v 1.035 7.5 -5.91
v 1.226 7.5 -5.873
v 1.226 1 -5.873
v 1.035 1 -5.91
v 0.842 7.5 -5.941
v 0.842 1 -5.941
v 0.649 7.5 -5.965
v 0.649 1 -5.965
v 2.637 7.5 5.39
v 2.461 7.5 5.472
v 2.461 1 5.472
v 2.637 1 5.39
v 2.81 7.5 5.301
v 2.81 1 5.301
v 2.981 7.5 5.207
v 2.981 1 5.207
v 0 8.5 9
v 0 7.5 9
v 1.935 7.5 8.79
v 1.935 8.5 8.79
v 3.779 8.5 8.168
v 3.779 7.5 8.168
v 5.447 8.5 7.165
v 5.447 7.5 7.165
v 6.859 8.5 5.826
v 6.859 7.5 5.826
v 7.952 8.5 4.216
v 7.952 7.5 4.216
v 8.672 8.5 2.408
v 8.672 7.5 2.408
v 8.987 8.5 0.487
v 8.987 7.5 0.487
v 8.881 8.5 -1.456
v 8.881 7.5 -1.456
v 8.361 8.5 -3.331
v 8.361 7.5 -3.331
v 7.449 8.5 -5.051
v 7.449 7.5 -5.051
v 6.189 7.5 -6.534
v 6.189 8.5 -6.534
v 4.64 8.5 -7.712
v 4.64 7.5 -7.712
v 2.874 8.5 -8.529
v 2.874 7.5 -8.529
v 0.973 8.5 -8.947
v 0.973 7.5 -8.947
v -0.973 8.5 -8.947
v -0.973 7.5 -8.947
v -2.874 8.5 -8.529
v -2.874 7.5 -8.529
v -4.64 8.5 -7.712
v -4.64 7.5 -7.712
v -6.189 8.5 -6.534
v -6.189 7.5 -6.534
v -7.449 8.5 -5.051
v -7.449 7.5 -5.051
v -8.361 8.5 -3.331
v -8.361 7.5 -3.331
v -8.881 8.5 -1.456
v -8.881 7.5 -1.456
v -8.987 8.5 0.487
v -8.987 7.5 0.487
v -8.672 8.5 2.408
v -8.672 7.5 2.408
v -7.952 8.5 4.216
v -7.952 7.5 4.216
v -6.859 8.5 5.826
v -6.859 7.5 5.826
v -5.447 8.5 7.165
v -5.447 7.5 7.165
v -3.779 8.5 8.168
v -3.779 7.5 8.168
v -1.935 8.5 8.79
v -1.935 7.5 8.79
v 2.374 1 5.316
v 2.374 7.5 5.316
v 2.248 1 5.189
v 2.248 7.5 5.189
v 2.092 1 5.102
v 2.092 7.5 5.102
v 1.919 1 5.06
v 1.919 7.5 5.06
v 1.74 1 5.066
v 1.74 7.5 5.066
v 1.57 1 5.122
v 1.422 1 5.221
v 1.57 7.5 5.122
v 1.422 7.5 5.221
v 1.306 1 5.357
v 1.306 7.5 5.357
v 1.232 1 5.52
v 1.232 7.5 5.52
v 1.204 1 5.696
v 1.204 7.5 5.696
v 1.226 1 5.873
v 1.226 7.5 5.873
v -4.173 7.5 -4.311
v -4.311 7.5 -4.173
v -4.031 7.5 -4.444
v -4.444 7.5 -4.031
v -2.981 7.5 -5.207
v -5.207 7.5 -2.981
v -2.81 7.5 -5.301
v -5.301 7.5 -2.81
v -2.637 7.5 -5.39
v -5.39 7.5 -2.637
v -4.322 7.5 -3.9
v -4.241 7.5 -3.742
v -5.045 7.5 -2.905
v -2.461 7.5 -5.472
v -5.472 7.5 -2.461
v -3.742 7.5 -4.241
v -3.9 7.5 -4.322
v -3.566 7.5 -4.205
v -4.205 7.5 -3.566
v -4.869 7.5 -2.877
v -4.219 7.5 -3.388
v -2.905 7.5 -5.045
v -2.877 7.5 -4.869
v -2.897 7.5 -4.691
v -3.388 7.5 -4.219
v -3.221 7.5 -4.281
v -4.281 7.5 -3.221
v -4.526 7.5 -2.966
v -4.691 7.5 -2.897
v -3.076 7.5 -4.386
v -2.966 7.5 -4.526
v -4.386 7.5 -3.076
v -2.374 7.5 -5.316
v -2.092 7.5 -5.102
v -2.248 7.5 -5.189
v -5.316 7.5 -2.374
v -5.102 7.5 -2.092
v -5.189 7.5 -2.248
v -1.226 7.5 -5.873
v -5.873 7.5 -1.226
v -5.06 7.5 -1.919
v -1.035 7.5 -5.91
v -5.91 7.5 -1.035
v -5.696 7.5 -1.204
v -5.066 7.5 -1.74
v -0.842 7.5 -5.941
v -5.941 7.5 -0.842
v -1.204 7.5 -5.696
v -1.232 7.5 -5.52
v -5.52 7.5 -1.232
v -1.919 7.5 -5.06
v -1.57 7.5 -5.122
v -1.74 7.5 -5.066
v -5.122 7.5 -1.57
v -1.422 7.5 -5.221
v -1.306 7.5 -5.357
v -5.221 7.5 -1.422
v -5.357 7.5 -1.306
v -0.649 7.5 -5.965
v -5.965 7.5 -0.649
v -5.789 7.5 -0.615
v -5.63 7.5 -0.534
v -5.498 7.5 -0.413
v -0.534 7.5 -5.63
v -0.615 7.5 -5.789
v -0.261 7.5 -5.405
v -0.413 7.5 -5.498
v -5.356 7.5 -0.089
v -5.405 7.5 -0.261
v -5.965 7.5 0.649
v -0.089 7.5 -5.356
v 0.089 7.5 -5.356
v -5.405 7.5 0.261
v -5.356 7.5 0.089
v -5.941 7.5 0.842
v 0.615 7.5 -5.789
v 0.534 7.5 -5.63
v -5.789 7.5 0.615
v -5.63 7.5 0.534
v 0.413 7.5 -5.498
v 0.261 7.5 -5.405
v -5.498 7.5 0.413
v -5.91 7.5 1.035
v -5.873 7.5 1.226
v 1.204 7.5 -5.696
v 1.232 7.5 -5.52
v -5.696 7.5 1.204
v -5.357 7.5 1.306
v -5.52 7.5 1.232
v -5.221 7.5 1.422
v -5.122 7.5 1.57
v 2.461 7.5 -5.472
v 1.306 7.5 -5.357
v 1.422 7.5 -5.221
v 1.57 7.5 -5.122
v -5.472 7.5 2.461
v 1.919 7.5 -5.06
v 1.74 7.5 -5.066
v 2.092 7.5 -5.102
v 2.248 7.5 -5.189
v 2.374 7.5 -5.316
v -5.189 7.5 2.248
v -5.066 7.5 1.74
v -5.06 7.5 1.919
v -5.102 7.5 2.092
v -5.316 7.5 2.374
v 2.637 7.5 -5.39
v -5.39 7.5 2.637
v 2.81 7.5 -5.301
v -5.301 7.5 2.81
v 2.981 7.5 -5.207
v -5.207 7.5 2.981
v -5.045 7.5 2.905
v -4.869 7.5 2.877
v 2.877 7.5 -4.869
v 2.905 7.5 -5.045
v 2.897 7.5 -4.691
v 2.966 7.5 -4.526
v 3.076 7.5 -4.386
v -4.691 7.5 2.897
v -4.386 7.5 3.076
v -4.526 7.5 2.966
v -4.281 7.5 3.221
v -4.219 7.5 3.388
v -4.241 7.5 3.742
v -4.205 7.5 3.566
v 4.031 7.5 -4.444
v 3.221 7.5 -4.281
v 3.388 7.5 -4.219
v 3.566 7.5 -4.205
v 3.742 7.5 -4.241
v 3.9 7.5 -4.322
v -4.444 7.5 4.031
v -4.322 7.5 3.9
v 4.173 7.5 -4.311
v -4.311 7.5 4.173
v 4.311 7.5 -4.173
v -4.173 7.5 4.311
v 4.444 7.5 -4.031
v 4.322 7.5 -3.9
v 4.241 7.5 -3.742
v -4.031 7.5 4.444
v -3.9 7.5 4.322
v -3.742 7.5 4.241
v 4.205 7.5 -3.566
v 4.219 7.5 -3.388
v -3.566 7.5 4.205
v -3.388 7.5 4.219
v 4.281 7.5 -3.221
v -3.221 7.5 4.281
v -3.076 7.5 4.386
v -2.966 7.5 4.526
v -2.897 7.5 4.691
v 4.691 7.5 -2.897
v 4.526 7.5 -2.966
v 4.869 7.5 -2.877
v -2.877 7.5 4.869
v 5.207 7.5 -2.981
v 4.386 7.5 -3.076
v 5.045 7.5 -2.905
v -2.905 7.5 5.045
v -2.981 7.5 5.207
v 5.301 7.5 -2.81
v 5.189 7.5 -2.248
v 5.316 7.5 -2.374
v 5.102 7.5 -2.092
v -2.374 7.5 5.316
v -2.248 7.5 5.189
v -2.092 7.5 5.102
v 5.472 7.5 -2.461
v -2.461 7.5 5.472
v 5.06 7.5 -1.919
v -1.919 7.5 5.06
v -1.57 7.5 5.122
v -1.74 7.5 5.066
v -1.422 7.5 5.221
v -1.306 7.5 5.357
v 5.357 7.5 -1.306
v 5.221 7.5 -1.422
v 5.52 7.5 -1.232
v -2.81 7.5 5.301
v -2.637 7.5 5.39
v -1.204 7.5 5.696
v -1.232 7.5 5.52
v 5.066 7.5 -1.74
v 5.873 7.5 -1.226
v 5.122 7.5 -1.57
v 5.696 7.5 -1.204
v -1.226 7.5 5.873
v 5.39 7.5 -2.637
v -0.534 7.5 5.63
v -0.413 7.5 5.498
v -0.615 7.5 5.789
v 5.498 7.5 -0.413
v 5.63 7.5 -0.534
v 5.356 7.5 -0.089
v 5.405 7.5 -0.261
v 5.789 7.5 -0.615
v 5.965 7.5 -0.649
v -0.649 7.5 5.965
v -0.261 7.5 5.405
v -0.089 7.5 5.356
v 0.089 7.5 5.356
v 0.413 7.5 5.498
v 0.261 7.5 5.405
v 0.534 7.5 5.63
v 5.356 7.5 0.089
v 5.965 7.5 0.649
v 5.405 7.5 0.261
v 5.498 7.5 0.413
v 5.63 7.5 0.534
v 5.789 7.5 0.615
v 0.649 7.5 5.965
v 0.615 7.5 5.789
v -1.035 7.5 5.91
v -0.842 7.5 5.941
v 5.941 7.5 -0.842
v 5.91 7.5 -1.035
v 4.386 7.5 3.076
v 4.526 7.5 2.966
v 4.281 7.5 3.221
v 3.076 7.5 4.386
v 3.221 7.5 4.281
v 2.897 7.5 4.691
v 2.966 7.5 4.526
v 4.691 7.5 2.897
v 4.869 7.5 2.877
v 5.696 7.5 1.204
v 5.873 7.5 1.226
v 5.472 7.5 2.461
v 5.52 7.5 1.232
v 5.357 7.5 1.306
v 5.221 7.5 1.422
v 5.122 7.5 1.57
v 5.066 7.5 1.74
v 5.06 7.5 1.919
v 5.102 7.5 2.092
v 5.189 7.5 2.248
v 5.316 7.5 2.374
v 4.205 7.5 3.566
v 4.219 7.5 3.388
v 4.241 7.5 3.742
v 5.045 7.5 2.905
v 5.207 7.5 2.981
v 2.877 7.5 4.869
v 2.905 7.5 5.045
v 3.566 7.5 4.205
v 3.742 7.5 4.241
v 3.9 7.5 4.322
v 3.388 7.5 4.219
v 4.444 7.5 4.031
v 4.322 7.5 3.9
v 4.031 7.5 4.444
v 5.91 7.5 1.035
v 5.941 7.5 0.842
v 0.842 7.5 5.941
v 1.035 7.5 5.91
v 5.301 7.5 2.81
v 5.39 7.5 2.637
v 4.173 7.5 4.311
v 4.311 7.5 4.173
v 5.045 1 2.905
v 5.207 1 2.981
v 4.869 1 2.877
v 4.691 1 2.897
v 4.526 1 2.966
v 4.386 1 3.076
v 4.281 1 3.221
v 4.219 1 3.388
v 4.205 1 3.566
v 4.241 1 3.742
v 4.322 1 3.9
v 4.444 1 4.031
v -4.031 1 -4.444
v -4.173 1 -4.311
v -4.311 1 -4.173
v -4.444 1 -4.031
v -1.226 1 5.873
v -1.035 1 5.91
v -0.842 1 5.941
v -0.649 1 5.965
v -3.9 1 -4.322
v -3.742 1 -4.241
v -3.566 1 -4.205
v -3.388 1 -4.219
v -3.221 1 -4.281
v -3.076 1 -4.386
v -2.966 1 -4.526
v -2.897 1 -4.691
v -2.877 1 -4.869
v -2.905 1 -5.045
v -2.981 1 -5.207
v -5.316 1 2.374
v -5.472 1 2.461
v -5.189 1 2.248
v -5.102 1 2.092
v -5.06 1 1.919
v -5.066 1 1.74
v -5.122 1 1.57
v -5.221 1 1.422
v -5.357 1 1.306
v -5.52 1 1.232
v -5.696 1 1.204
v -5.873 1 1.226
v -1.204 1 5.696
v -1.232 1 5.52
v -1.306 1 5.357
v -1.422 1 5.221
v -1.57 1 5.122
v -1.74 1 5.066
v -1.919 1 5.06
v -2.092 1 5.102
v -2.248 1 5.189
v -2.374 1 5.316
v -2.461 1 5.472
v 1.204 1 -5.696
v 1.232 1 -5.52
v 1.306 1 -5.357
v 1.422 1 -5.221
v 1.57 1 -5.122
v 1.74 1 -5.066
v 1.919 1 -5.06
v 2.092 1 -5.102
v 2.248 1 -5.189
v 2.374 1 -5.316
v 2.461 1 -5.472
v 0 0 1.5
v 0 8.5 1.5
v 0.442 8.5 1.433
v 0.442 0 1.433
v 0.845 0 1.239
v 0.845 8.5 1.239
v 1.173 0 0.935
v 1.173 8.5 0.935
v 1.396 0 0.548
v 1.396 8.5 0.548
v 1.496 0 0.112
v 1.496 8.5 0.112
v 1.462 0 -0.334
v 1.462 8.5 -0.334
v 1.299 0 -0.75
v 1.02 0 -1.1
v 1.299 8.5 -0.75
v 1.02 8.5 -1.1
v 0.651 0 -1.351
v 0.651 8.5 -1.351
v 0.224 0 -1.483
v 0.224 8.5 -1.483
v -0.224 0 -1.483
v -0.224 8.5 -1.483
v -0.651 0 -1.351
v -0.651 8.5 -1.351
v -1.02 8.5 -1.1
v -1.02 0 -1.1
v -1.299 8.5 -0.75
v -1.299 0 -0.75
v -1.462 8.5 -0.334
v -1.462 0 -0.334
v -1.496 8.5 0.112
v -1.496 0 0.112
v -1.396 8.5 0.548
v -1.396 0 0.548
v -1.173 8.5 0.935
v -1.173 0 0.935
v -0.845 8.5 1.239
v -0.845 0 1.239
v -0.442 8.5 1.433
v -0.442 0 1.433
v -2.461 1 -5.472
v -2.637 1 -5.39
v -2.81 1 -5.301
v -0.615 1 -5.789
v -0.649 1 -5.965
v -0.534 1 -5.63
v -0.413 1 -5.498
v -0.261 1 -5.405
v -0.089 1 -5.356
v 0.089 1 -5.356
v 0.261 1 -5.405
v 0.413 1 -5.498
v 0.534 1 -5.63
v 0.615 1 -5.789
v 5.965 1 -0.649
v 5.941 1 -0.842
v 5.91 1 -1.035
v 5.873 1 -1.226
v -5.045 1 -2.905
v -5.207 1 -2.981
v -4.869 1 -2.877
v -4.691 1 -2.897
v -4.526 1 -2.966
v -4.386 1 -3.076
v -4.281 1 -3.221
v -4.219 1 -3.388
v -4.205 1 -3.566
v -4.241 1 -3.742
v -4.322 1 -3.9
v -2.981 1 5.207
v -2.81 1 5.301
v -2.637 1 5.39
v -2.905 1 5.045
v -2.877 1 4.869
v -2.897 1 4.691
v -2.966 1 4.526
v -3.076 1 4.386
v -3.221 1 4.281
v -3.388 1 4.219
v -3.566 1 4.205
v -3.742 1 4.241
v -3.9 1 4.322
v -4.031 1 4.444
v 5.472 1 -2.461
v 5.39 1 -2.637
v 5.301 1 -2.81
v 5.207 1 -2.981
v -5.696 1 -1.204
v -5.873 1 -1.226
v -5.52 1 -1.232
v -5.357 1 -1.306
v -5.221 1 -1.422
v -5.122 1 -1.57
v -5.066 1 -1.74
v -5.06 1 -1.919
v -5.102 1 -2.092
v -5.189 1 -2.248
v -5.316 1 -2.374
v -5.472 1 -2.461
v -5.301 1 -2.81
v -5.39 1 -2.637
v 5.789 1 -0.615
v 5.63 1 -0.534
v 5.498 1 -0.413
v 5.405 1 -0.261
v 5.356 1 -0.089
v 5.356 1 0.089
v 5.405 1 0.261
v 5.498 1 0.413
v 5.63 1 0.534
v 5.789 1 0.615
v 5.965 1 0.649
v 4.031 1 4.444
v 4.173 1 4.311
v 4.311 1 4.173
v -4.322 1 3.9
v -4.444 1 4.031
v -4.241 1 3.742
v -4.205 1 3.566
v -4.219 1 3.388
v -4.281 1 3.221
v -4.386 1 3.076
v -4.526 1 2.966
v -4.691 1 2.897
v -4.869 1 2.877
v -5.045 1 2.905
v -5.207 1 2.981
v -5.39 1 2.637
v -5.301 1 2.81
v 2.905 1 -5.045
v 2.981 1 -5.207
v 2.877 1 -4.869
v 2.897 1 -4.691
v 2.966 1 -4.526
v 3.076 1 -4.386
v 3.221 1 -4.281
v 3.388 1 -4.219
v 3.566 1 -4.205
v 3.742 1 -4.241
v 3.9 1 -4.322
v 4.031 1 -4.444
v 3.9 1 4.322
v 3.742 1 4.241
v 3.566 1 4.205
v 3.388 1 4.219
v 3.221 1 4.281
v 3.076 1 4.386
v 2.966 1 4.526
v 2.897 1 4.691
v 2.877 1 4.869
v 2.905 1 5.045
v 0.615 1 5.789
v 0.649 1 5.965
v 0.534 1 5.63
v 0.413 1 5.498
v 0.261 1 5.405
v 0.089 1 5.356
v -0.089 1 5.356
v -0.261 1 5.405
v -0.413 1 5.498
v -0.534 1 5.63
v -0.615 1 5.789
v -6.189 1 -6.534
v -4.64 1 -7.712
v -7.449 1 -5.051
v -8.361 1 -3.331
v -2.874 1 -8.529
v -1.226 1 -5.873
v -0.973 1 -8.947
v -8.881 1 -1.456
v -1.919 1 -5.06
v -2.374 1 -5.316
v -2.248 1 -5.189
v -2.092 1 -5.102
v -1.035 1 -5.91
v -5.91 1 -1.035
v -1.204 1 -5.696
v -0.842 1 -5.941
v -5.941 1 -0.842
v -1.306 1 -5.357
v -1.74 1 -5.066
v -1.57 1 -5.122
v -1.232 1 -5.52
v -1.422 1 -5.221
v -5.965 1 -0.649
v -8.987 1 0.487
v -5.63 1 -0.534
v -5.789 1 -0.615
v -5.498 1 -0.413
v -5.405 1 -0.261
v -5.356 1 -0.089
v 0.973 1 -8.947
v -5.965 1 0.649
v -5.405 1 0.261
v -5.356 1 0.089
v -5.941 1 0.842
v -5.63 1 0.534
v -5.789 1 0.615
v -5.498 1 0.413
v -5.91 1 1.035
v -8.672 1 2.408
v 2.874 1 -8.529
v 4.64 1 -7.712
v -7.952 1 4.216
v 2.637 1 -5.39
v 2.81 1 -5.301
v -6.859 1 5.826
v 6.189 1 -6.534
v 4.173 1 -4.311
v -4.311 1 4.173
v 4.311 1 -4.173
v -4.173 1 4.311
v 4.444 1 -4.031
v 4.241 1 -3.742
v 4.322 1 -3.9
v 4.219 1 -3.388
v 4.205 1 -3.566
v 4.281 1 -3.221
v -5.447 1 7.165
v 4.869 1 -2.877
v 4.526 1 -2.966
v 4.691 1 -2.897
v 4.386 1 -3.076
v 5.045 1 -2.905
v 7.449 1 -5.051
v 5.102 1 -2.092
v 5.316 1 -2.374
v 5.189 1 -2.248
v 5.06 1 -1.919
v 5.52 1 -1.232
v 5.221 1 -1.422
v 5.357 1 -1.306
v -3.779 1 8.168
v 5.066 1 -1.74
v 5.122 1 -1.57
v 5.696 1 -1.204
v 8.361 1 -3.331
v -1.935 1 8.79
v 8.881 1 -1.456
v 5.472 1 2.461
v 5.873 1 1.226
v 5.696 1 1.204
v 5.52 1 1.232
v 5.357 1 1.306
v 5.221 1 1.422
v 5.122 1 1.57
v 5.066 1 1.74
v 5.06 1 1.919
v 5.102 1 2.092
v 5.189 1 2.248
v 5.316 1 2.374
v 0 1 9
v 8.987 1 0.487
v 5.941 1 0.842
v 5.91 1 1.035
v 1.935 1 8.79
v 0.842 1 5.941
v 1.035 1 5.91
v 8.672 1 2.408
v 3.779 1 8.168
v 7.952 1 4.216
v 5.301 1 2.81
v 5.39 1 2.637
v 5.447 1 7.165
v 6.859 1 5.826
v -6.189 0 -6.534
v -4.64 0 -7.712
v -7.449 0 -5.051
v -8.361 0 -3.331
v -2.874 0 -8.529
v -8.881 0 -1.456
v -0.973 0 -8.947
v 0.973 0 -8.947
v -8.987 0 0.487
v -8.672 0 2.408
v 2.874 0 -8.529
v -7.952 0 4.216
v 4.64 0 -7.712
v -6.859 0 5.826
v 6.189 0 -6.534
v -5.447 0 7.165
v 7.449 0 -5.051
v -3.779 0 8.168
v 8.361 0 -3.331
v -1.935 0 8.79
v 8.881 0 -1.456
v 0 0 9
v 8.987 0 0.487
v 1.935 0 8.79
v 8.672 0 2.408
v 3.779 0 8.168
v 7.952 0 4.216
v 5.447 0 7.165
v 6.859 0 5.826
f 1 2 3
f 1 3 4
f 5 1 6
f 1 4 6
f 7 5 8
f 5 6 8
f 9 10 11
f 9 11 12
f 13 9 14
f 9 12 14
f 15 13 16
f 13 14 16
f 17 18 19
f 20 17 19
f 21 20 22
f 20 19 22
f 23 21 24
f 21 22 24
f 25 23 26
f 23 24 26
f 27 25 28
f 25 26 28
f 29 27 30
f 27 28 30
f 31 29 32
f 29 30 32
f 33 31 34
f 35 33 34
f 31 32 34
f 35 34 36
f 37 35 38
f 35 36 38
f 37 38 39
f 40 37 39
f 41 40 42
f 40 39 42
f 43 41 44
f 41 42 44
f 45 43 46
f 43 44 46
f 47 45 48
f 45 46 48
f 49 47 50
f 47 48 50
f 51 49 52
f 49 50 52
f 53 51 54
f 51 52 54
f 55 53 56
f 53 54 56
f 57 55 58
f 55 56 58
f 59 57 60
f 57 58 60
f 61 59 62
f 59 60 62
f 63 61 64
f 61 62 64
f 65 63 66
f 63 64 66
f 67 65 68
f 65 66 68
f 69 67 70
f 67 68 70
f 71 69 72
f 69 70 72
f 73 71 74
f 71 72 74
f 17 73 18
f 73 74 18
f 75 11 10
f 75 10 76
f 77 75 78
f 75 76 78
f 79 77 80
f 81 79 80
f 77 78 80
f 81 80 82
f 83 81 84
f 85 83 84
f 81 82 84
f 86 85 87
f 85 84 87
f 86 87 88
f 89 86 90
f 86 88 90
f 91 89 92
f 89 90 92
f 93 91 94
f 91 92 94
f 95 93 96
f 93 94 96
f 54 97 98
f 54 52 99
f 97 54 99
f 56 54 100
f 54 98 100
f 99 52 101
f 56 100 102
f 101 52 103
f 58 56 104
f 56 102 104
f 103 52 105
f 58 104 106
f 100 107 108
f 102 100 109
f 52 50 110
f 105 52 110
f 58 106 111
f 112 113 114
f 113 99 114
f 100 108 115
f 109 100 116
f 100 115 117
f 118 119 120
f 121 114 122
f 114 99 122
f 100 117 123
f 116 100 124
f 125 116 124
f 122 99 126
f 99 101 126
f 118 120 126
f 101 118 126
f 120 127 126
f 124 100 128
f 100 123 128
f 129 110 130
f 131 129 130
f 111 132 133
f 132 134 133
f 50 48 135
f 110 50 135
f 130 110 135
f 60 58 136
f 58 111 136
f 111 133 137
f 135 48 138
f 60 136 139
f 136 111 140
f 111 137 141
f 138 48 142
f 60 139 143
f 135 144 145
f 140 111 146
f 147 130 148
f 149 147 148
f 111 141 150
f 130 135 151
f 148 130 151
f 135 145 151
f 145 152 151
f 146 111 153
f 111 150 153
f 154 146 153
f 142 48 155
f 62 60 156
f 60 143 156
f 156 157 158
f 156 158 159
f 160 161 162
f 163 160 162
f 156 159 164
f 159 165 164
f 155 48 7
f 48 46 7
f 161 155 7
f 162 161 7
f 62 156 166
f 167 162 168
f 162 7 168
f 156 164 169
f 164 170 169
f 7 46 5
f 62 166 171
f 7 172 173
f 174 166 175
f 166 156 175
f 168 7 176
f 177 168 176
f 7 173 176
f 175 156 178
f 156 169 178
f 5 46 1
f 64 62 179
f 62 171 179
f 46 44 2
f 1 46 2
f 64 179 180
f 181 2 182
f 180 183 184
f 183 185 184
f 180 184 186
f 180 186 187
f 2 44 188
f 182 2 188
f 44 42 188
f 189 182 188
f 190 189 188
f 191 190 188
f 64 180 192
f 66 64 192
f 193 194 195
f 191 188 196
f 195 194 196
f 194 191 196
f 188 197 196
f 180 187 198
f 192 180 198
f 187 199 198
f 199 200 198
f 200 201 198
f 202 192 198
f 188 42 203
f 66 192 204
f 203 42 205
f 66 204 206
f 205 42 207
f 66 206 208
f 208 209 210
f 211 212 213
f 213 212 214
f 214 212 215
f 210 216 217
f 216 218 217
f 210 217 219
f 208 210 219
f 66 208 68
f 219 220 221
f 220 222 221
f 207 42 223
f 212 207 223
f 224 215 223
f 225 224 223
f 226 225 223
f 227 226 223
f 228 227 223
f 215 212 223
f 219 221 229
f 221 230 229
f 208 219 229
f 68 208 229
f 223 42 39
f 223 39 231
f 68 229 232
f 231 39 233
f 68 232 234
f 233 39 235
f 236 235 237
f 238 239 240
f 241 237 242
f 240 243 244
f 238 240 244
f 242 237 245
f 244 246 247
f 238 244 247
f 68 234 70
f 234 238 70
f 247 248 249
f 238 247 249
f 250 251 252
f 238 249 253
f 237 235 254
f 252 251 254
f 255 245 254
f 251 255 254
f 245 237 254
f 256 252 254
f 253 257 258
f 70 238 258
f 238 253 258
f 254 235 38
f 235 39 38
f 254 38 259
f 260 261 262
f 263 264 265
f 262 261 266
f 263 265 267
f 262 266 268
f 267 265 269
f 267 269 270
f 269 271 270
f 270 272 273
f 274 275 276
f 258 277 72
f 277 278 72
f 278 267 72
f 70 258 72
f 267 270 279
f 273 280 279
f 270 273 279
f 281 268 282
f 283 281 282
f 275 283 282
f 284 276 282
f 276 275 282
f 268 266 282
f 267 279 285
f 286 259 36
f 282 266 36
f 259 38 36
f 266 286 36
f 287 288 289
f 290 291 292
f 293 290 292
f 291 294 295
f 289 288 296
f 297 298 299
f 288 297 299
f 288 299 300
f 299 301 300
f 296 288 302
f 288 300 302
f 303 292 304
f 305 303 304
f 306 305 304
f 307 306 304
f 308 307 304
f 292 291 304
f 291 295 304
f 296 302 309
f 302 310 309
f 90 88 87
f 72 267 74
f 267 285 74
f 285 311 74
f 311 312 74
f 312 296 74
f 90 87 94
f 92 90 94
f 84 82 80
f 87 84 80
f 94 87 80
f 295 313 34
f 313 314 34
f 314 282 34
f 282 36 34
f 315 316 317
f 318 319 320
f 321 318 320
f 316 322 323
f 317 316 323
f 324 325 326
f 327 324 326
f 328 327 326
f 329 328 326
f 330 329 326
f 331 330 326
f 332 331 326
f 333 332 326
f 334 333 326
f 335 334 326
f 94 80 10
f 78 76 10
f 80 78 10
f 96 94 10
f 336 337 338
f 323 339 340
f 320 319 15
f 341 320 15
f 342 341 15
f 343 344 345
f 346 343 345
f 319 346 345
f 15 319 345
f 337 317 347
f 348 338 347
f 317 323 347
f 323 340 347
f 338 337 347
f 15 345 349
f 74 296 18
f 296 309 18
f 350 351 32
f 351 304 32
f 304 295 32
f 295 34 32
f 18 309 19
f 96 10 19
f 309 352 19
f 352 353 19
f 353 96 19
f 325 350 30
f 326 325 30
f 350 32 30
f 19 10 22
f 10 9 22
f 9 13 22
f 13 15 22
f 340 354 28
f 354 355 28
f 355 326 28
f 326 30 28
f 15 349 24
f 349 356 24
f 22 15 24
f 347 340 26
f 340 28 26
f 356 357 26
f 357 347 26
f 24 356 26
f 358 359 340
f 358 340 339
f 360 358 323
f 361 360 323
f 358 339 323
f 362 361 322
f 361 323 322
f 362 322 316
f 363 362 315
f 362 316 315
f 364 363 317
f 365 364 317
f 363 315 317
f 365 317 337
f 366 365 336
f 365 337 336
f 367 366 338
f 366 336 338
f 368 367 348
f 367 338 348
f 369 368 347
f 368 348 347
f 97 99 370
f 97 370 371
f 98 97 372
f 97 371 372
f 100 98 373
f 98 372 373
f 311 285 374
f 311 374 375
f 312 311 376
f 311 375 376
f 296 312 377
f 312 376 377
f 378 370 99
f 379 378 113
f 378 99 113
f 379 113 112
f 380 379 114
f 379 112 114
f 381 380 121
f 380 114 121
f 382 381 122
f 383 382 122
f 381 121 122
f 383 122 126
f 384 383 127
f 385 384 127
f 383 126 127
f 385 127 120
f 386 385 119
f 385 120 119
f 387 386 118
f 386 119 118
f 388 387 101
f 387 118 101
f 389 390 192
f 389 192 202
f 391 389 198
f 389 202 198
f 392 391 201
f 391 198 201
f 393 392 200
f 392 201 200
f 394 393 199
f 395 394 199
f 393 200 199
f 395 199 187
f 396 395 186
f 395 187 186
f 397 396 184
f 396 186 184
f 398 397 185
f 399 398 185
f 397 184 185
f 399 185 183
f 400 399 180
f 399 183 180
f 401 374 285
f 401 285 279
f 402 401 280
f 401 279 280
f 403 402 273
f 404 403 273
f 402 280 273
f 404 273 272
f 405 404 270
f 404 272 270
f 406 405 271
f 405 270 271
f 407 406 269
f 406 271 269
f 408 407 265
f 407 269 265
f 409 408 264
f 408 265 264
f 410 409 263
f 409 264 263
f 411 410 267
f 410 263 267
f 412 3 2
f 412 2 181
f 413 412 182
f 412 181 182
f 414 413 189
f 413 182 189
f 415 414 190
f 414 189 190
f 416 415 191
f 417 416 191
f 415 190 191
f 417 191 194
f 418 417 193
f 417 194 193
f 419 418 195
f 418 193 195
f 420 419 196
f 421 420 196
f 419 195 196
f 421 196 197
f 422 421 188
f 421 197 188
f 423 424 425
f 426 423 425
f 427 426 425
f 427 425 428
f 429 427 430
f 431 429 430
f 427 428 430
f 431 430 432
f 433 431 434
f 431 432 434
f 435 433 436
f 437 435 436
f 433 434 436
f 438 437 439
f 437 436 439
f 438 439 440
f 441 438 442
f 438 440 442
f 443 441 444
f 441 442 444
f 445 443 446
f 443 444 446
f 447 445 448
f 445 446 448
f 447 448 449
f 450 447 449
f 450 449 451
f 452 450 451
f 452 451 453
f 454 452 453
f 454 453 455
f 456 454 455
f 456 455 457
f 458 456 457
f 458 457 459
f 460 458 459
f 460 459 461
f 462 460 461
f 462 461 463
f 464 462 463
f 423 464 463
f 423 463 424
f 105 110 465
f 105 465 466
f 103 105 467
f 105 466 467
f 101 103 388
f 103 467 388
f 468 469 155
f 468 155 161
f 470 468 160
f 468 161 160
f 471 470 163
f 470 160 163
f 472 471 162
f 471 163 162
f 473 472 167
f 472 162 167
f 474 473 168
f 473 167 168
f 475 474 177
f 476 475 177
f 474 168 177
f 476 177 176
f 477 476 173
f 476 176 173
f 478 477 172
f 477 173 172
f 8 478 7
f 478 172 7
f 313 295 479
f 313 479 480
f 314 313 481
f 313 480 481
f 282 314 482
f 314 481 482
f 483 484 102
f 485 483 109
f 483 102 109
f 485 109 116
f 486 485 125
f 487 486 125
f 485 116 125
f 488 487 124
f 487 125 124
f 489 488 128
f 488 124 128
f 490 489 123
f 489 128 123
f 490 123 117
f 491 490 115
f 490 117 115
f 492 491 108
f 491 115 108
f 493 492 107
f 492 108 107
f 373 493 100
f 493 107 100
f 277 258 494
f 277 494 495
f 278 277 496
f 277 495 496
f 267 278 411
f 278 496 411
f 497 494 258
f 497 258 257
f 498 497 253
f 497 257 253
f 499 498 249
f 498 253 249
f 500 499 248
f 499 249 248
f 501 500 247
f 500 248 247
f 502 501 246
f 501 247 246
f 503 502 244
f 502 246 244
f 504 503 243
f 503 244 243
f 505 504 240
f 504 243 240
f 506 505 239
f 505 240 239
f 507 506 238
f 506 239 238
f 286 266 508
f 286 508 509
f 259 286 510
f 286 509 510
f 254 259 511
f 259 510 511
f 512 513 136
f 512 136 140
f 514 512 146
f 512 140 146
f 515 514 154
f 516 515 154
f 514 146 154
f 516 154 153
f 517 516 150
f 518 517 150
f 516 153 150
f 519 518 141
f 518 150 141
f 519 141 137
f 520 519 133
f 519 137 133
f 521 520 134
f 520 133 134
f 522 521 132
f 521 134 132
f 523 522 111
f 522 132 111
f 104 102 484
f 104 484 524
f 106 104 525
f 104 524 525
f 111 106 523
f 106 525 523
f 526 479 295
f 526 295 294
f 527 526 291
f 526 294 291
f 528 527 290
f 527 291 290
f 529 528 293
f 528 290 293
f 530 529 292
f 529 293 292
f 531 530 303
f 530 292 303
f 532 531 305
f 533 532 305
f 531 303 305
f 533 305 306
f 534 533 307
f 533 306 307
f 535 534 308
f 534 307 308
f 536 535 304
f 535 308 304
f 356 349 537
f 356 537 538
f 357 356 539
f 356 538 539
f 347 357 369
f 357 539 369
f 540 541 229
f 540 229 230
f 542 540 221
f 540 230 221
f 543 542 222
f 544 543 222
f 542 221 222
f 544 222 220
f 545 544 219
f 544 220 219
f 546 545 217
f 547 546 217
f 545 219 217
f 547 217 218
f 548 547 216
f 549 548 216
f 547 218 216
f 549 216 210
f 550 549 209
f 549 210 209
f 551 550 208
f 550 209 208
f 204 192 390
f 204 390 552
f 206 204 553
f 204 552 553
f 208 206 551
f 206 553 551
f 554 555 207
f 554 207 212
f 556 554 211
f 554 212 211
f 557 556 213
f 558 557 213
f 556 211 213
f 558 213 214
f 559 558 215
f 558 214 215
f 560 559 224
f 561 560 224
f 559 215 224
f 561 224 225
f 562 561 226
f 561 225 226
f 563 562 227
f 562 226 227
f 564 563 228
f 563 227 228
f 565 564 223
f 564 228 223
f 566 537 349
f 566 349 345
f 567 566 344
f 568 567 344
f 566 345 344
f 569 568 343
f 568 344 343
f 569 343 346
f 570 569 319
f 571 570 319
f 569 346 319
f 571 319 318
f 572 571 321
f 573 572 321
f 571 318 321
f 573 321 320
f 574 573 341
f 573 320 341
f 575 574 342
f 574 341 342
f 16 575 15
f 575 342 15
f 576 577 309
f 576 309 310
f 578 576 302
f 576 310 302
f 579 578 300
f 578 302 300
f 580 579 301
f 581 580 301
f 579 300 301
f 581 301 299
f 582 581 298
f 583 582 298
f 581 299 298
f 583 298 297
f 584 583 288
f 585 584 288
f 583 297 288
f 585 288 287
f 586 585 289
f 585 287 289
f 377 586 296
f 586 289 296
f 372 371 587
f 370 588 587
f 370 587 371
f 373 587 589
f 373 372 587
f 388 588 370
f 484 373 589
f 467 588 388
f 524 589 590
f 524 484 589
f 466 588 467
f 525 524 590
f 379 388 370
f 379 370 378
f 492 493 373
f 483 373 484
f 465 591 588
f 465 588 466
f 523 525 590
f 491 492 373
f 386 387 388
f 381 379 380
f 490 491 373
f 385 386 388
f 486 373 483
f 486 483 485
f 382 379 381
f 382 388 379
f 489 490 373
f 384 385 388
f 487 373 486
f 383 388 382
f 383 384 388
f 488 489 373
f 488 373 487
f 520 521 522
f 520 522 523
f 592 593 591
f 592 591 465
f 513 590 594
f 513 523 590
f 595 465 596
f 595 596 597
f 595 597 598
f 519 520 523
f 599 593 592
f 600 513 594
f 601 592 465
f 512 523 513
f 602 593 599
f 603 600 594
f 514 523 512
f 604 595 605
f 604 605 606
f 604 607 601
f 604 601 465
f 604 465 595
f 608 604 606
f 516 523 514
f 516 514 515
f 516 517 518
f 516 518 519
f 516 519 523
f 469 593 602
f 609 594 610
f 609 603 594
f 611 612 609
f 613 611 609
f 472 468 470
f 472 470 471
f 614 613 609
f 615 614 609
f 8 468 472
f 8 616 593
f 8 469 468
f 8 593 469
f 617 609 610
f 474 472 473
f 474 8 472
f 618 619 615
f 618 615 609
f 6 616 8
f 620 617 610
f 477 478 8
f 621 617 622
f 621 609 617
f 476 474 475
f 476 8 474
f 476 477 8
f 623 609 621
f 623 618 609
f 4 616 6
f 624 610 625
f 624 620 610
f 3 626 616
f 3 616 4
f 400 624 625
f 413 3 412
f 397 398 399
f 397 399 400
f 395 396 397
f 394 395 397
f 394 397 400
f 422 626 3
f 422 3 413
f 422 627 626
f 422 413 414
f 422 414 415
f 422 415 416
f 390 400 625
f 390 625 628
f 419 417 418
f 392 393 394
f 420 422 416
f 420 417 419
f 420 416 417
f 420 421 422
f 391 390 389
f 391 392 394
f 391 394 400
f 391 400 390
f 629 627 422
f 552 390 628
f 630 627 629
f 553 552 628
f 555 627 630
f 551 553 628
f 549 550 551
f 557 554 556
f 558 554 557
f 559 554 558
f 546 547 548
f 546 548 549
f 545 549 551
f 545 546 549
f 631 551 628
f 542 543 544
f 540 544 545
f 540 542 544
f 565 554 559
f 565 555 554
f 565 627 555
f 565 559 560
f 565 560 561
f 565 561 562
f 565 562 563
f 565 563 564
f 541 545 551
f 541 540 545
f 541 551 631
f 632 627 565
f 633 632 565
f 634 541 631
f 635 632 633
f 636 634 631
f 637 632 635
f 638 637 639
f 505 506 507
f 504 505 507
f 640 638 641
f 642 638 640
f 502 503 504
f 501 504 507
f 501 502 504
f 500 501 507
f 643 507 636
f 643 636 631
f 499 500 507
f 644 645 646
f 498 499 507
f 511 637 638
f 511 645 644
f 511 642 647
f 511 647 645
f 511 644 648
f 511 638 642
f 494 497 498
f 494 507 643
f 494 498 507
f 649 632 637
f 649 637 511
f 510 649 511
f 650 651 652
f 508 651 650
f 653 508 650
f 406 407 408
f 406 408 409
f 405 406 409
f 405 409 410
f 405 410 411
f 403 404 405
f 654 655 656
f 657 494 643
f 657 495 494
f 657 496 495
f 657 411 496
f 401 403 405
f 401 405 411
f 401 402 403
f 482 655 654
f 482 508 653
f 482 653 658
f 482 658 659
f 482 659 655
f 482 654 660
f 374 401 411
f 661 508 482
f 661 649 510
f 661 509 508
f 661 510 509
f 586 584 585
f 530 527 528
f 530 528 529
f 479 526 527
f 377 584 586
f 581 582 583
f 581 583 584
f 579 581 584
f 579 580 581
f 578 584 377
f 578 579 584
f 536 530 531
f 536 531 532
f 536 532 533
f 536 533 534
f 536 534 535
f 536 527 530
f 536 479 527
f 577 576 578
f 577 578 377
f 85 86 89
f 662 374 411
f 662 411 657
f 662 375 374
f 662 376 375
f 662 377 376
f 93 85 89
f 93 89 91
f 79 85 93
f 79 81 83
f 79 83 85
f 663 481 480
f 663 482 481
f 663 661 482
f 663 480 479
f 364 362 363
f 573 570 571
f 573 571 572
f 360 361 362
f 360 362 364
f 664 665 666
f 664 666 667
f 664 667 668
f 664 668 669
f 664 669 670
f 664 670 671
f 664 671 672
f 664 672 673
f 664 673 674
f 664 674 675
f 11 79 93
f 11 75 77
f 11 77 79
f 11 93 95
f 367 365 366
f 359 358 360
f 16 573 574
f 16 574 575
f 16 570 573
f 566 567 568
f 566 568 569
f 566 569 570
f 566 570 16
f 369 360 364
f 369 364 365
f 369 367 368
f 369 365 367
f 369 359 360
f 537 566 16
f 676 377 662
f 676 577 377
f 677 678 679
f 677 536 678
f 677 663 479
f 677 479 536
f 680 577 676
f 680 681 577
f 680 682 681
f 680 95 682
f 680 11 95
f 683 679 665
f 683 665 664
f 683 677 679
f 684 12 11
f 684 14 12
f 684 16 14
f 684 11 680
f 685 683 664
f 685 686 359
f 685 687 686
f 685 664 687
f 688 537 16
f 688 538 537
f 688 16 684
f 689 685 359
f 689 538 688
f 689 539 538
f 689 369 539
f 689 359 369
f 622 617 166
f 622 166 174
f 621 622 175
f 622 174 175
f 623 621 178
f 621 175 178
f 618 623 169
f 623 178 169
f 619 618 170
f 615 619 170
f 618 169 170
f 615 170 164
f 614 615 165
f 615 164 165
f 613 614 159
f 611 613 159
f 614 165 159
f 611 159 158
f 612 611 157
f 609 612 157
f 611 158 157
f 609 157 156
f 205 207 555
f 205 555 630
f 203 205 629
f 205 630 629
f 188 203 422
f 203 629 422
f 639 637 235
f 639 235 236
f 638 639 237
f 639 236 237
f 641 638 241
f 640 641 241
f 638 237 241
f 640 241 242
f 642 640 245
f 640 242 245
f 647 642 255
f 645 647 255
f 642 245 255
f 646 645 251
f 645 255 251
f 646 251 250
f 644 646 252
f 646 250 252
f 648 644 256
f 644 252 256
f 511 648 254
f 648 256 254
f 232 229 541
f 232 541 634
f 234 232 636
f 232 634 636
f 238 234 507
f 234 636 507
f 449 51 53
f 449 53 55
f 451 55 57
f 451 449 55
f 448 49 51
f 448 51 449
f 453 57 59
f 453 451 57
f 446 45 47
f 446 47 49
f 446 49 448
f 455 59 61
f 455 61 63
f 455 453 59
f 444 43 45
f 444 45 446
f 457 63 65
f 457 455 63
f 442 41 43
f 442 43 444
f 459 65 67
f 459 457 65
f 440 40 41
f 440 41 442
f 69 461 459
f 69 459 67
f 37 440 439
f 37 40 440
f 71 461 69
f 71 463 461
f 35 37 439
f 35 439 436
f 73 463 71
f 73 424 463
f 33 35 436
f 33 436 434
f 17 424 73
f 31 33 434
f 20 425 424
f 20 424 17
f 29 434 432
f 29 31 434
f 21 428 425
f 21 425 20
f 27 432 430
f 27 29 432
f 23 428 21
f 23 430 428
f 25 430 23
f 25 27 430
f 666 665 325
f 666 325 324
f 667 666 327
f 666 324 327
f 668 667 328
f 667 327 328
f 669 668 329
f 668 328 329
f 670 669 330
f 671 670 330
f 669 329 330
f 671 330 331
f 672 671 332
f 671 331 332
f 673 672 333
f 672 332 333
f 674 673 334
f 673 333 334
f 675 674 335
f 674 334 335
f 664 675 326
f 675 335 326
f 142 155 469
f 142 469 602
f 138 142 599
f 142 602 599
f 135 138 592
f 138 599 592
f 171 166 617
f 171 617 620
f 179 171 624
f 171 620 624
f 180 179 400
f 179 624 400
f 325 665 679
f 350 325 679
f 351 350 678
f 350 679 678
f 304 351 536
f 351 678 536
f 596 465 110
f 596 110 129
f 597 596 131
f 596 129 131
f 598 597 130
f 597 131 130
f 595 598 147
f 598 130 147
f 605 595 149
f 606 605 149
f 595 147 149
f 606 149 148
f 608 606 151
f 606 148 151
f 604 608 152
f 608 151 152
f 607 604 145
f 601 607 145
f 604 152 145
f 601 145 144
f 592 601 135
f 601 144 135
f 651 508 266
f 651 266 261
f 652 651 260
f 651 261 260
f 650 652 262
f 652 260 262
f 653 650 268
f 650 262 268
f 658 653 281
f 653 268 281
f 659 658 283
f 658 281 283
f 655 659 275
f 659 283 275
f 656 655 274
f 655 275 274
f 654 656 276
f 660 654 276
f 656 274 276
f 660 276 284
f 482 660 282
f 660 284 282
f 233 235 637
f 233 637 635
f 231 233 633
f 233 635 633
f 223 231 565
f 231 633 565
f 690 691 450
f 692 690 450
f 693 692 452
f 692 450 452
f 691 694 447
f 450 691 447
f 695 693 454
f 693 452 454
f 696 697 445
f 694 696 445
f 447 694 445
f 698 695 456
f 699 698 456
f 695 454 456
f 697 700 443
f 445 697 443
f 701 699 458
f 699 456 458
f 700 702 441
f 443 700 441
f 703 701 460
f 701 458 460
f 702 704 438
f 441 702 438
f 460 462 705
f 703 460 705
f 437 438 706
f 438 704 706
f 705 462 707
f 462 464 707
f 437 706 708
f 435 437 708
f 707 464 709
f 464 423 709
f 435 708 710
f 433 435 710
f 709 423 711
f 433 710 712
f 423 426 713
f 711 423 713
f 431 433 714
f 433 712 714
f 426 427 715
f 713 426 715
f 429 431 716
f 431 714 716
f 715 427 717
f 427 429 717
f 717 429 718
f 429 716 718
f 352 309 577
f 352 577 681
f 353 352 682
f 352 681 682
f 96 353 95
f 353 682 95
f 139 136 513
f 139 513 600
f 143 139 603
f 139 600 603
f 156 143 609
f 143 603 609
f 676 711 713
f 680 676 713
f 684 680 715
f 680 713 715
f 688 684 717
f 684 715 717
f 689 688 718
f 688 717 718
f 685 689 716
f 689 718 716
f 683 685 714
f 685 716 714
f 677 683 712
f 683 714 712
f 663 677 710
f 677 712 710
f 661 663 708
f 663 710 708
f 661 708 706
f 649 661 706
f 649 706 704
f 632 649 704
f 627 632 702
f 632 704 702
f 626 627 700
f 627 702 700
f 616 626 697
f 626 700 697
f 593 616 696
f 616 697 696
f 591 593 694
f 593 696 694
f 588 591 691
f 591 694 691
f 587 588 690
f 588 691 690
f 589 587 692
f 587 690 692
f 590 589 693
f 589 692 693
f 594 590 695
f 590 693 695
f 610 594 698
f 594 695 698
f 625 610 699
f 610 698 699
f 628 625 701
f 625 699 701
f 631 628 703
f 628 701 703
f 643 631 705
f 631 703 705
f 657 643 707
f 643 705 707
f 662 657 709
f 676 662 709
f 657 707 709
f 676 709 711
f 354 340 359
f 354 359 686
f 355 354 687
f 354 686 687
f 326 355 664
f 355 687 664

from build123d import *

# Parameters (mm, degrees)
SKETCH_1_R          = 9
EXTRUDE_1_DEPTH     = 1
SKETCH_2_R          = 6
EXTRUDE_2_DEPTH     = 6.5
SKETCH_3_R          = 0.65
CUT_EXTRUDE_1_DEPTH = 6.5
SKETCH_5_R          = 9
EXTRUDE_3_DEPTH     = 1
SKETCH_6_R          = 1.5
CUT_EXTRUDE_2_DEPTH = 16.305227865


with BuildPart() as part:
    # 草图1 → 凸台-拉伸1 (new body)
    with BuildSketch(Plane(origin=(0, 0, 0), x_dir=(1, 0, 0), z_dir=(0, 1, 0))):
        with Locations(Location((0, 0, 0), (0, 0, 270))):
            Circle(SKETCH_1_R)
    extrude(amount=EXTRUDE_1_DEPTH)

    # 草图2 → 凸台-拉伸2 (add)
    with BuildSketch(Plane(origin=(0, 1, 0), x_dir=(1, 0, 0), z_dir=(0, 1, 0))):
        with Locations(Location((0, 0, 0), (0, 0, 90))):
            Circle(SKETCH_2_R)
    extrude(amount=EXTRUDE_2_DEPTH)

    # 草图3 → 切除-拉伸1 (cut)
    with BuildSketch(Plane(origin=(0, 7.5, 0), x_dir=(1, 0, 0), z_dir=(0, 1, 0))):
        with Locations((0, 6)):
            Circle(SKETCH_3_R)
        with Locations((1.854101966, 5.706339098)):
            Circle(SKETCH_3_R)
        with Locations((3.526711514, 4.854101966)):
            Circle(SKETCH_3_R)
        with Locations((4.854101966, 3.526711514)):
            Circle(SKETCH_3_R)
        with Locations((5.706339098, 1.854101966)):
            Circle(SKETCH_3_R)
        with Locations((6, 0)):
            Circle(SKETCH_3_R)
        with Locations((5.706339098, -1.854101966)):
            Circle(SKETCH_3_R)
        with Locations((4.854101966, -3.526711514)):
            Circle(SKETCH_3_R)
        with Locations((3.526711514, -4.854101966)):
            Circle(SKETCH_3_R)
        with Locations((1.854101966, -5.706339098)):
            Circle(SKETCH_3_R)
        with Locations((0, -6)):
            Circle(SKETCH_3_R)
        with Locations((-1.854101966, -5.706339098)):
            Circle(SKETCH_3_R)
        with Locations((-3.526711514, -4.854101966)):
            Circle(SKETCH_3_R)
        with Locations((-4.854101966, -3.526711514)):
            Circle(SKETCH_3_R)
        with Locations((-5.706339098, -1.854101966)):
            Circle(SKETCH_3_R)
        with Locations((-6, 0)):
            Circle(SKETCH_3_R)
        with Locations((-5.706339098, 1.854101966)):
            Circle(SKETCH_3_R)
        with Locations((-4.854101966, 3.526711514)):
            Circle(SKETCH_3_R)
        with Locations((-3.526711514, 4.854101966)):
            Circle(SKETCH_3_R)
        with Locations((-1.854101966, 5.706339098)):
            Circle(SKETCH_3_R)
    extrude(amount=-CUT_EXTRUDE_1_DEPTH, mode=Mode.SUBTRACT)

    # 草图5 → 凸台-拉伸3 (add)
    with BuildSketch(Plane(origin=(0, 7.5, 0), x_dir=(1, 0, 0), z_dir=(0, 1, 0))):
        with Locations(Location((0, 0, 0), (0, 0, 270))):
            Circle(SKETCH_5_R)
    extrude(amount=EXTRUDE_3_DEPTH)

    # 草图6 → 切除-拉伸2 (cut, through all)
    with BuildSketch(Plane(origin=(0, 8.5, 0), x_dir=(1, 0, 0), z_dir=(0, 1, 0))):
        with Locations(Location((0, 0, 0), (0, 0, 270))):
            Circle(SKETCH_6_R)
    extrude(amount=-CUT_EXTRUDE_2_DEPTH, mode=Mode.SUBTRACT)


solid = part.part
